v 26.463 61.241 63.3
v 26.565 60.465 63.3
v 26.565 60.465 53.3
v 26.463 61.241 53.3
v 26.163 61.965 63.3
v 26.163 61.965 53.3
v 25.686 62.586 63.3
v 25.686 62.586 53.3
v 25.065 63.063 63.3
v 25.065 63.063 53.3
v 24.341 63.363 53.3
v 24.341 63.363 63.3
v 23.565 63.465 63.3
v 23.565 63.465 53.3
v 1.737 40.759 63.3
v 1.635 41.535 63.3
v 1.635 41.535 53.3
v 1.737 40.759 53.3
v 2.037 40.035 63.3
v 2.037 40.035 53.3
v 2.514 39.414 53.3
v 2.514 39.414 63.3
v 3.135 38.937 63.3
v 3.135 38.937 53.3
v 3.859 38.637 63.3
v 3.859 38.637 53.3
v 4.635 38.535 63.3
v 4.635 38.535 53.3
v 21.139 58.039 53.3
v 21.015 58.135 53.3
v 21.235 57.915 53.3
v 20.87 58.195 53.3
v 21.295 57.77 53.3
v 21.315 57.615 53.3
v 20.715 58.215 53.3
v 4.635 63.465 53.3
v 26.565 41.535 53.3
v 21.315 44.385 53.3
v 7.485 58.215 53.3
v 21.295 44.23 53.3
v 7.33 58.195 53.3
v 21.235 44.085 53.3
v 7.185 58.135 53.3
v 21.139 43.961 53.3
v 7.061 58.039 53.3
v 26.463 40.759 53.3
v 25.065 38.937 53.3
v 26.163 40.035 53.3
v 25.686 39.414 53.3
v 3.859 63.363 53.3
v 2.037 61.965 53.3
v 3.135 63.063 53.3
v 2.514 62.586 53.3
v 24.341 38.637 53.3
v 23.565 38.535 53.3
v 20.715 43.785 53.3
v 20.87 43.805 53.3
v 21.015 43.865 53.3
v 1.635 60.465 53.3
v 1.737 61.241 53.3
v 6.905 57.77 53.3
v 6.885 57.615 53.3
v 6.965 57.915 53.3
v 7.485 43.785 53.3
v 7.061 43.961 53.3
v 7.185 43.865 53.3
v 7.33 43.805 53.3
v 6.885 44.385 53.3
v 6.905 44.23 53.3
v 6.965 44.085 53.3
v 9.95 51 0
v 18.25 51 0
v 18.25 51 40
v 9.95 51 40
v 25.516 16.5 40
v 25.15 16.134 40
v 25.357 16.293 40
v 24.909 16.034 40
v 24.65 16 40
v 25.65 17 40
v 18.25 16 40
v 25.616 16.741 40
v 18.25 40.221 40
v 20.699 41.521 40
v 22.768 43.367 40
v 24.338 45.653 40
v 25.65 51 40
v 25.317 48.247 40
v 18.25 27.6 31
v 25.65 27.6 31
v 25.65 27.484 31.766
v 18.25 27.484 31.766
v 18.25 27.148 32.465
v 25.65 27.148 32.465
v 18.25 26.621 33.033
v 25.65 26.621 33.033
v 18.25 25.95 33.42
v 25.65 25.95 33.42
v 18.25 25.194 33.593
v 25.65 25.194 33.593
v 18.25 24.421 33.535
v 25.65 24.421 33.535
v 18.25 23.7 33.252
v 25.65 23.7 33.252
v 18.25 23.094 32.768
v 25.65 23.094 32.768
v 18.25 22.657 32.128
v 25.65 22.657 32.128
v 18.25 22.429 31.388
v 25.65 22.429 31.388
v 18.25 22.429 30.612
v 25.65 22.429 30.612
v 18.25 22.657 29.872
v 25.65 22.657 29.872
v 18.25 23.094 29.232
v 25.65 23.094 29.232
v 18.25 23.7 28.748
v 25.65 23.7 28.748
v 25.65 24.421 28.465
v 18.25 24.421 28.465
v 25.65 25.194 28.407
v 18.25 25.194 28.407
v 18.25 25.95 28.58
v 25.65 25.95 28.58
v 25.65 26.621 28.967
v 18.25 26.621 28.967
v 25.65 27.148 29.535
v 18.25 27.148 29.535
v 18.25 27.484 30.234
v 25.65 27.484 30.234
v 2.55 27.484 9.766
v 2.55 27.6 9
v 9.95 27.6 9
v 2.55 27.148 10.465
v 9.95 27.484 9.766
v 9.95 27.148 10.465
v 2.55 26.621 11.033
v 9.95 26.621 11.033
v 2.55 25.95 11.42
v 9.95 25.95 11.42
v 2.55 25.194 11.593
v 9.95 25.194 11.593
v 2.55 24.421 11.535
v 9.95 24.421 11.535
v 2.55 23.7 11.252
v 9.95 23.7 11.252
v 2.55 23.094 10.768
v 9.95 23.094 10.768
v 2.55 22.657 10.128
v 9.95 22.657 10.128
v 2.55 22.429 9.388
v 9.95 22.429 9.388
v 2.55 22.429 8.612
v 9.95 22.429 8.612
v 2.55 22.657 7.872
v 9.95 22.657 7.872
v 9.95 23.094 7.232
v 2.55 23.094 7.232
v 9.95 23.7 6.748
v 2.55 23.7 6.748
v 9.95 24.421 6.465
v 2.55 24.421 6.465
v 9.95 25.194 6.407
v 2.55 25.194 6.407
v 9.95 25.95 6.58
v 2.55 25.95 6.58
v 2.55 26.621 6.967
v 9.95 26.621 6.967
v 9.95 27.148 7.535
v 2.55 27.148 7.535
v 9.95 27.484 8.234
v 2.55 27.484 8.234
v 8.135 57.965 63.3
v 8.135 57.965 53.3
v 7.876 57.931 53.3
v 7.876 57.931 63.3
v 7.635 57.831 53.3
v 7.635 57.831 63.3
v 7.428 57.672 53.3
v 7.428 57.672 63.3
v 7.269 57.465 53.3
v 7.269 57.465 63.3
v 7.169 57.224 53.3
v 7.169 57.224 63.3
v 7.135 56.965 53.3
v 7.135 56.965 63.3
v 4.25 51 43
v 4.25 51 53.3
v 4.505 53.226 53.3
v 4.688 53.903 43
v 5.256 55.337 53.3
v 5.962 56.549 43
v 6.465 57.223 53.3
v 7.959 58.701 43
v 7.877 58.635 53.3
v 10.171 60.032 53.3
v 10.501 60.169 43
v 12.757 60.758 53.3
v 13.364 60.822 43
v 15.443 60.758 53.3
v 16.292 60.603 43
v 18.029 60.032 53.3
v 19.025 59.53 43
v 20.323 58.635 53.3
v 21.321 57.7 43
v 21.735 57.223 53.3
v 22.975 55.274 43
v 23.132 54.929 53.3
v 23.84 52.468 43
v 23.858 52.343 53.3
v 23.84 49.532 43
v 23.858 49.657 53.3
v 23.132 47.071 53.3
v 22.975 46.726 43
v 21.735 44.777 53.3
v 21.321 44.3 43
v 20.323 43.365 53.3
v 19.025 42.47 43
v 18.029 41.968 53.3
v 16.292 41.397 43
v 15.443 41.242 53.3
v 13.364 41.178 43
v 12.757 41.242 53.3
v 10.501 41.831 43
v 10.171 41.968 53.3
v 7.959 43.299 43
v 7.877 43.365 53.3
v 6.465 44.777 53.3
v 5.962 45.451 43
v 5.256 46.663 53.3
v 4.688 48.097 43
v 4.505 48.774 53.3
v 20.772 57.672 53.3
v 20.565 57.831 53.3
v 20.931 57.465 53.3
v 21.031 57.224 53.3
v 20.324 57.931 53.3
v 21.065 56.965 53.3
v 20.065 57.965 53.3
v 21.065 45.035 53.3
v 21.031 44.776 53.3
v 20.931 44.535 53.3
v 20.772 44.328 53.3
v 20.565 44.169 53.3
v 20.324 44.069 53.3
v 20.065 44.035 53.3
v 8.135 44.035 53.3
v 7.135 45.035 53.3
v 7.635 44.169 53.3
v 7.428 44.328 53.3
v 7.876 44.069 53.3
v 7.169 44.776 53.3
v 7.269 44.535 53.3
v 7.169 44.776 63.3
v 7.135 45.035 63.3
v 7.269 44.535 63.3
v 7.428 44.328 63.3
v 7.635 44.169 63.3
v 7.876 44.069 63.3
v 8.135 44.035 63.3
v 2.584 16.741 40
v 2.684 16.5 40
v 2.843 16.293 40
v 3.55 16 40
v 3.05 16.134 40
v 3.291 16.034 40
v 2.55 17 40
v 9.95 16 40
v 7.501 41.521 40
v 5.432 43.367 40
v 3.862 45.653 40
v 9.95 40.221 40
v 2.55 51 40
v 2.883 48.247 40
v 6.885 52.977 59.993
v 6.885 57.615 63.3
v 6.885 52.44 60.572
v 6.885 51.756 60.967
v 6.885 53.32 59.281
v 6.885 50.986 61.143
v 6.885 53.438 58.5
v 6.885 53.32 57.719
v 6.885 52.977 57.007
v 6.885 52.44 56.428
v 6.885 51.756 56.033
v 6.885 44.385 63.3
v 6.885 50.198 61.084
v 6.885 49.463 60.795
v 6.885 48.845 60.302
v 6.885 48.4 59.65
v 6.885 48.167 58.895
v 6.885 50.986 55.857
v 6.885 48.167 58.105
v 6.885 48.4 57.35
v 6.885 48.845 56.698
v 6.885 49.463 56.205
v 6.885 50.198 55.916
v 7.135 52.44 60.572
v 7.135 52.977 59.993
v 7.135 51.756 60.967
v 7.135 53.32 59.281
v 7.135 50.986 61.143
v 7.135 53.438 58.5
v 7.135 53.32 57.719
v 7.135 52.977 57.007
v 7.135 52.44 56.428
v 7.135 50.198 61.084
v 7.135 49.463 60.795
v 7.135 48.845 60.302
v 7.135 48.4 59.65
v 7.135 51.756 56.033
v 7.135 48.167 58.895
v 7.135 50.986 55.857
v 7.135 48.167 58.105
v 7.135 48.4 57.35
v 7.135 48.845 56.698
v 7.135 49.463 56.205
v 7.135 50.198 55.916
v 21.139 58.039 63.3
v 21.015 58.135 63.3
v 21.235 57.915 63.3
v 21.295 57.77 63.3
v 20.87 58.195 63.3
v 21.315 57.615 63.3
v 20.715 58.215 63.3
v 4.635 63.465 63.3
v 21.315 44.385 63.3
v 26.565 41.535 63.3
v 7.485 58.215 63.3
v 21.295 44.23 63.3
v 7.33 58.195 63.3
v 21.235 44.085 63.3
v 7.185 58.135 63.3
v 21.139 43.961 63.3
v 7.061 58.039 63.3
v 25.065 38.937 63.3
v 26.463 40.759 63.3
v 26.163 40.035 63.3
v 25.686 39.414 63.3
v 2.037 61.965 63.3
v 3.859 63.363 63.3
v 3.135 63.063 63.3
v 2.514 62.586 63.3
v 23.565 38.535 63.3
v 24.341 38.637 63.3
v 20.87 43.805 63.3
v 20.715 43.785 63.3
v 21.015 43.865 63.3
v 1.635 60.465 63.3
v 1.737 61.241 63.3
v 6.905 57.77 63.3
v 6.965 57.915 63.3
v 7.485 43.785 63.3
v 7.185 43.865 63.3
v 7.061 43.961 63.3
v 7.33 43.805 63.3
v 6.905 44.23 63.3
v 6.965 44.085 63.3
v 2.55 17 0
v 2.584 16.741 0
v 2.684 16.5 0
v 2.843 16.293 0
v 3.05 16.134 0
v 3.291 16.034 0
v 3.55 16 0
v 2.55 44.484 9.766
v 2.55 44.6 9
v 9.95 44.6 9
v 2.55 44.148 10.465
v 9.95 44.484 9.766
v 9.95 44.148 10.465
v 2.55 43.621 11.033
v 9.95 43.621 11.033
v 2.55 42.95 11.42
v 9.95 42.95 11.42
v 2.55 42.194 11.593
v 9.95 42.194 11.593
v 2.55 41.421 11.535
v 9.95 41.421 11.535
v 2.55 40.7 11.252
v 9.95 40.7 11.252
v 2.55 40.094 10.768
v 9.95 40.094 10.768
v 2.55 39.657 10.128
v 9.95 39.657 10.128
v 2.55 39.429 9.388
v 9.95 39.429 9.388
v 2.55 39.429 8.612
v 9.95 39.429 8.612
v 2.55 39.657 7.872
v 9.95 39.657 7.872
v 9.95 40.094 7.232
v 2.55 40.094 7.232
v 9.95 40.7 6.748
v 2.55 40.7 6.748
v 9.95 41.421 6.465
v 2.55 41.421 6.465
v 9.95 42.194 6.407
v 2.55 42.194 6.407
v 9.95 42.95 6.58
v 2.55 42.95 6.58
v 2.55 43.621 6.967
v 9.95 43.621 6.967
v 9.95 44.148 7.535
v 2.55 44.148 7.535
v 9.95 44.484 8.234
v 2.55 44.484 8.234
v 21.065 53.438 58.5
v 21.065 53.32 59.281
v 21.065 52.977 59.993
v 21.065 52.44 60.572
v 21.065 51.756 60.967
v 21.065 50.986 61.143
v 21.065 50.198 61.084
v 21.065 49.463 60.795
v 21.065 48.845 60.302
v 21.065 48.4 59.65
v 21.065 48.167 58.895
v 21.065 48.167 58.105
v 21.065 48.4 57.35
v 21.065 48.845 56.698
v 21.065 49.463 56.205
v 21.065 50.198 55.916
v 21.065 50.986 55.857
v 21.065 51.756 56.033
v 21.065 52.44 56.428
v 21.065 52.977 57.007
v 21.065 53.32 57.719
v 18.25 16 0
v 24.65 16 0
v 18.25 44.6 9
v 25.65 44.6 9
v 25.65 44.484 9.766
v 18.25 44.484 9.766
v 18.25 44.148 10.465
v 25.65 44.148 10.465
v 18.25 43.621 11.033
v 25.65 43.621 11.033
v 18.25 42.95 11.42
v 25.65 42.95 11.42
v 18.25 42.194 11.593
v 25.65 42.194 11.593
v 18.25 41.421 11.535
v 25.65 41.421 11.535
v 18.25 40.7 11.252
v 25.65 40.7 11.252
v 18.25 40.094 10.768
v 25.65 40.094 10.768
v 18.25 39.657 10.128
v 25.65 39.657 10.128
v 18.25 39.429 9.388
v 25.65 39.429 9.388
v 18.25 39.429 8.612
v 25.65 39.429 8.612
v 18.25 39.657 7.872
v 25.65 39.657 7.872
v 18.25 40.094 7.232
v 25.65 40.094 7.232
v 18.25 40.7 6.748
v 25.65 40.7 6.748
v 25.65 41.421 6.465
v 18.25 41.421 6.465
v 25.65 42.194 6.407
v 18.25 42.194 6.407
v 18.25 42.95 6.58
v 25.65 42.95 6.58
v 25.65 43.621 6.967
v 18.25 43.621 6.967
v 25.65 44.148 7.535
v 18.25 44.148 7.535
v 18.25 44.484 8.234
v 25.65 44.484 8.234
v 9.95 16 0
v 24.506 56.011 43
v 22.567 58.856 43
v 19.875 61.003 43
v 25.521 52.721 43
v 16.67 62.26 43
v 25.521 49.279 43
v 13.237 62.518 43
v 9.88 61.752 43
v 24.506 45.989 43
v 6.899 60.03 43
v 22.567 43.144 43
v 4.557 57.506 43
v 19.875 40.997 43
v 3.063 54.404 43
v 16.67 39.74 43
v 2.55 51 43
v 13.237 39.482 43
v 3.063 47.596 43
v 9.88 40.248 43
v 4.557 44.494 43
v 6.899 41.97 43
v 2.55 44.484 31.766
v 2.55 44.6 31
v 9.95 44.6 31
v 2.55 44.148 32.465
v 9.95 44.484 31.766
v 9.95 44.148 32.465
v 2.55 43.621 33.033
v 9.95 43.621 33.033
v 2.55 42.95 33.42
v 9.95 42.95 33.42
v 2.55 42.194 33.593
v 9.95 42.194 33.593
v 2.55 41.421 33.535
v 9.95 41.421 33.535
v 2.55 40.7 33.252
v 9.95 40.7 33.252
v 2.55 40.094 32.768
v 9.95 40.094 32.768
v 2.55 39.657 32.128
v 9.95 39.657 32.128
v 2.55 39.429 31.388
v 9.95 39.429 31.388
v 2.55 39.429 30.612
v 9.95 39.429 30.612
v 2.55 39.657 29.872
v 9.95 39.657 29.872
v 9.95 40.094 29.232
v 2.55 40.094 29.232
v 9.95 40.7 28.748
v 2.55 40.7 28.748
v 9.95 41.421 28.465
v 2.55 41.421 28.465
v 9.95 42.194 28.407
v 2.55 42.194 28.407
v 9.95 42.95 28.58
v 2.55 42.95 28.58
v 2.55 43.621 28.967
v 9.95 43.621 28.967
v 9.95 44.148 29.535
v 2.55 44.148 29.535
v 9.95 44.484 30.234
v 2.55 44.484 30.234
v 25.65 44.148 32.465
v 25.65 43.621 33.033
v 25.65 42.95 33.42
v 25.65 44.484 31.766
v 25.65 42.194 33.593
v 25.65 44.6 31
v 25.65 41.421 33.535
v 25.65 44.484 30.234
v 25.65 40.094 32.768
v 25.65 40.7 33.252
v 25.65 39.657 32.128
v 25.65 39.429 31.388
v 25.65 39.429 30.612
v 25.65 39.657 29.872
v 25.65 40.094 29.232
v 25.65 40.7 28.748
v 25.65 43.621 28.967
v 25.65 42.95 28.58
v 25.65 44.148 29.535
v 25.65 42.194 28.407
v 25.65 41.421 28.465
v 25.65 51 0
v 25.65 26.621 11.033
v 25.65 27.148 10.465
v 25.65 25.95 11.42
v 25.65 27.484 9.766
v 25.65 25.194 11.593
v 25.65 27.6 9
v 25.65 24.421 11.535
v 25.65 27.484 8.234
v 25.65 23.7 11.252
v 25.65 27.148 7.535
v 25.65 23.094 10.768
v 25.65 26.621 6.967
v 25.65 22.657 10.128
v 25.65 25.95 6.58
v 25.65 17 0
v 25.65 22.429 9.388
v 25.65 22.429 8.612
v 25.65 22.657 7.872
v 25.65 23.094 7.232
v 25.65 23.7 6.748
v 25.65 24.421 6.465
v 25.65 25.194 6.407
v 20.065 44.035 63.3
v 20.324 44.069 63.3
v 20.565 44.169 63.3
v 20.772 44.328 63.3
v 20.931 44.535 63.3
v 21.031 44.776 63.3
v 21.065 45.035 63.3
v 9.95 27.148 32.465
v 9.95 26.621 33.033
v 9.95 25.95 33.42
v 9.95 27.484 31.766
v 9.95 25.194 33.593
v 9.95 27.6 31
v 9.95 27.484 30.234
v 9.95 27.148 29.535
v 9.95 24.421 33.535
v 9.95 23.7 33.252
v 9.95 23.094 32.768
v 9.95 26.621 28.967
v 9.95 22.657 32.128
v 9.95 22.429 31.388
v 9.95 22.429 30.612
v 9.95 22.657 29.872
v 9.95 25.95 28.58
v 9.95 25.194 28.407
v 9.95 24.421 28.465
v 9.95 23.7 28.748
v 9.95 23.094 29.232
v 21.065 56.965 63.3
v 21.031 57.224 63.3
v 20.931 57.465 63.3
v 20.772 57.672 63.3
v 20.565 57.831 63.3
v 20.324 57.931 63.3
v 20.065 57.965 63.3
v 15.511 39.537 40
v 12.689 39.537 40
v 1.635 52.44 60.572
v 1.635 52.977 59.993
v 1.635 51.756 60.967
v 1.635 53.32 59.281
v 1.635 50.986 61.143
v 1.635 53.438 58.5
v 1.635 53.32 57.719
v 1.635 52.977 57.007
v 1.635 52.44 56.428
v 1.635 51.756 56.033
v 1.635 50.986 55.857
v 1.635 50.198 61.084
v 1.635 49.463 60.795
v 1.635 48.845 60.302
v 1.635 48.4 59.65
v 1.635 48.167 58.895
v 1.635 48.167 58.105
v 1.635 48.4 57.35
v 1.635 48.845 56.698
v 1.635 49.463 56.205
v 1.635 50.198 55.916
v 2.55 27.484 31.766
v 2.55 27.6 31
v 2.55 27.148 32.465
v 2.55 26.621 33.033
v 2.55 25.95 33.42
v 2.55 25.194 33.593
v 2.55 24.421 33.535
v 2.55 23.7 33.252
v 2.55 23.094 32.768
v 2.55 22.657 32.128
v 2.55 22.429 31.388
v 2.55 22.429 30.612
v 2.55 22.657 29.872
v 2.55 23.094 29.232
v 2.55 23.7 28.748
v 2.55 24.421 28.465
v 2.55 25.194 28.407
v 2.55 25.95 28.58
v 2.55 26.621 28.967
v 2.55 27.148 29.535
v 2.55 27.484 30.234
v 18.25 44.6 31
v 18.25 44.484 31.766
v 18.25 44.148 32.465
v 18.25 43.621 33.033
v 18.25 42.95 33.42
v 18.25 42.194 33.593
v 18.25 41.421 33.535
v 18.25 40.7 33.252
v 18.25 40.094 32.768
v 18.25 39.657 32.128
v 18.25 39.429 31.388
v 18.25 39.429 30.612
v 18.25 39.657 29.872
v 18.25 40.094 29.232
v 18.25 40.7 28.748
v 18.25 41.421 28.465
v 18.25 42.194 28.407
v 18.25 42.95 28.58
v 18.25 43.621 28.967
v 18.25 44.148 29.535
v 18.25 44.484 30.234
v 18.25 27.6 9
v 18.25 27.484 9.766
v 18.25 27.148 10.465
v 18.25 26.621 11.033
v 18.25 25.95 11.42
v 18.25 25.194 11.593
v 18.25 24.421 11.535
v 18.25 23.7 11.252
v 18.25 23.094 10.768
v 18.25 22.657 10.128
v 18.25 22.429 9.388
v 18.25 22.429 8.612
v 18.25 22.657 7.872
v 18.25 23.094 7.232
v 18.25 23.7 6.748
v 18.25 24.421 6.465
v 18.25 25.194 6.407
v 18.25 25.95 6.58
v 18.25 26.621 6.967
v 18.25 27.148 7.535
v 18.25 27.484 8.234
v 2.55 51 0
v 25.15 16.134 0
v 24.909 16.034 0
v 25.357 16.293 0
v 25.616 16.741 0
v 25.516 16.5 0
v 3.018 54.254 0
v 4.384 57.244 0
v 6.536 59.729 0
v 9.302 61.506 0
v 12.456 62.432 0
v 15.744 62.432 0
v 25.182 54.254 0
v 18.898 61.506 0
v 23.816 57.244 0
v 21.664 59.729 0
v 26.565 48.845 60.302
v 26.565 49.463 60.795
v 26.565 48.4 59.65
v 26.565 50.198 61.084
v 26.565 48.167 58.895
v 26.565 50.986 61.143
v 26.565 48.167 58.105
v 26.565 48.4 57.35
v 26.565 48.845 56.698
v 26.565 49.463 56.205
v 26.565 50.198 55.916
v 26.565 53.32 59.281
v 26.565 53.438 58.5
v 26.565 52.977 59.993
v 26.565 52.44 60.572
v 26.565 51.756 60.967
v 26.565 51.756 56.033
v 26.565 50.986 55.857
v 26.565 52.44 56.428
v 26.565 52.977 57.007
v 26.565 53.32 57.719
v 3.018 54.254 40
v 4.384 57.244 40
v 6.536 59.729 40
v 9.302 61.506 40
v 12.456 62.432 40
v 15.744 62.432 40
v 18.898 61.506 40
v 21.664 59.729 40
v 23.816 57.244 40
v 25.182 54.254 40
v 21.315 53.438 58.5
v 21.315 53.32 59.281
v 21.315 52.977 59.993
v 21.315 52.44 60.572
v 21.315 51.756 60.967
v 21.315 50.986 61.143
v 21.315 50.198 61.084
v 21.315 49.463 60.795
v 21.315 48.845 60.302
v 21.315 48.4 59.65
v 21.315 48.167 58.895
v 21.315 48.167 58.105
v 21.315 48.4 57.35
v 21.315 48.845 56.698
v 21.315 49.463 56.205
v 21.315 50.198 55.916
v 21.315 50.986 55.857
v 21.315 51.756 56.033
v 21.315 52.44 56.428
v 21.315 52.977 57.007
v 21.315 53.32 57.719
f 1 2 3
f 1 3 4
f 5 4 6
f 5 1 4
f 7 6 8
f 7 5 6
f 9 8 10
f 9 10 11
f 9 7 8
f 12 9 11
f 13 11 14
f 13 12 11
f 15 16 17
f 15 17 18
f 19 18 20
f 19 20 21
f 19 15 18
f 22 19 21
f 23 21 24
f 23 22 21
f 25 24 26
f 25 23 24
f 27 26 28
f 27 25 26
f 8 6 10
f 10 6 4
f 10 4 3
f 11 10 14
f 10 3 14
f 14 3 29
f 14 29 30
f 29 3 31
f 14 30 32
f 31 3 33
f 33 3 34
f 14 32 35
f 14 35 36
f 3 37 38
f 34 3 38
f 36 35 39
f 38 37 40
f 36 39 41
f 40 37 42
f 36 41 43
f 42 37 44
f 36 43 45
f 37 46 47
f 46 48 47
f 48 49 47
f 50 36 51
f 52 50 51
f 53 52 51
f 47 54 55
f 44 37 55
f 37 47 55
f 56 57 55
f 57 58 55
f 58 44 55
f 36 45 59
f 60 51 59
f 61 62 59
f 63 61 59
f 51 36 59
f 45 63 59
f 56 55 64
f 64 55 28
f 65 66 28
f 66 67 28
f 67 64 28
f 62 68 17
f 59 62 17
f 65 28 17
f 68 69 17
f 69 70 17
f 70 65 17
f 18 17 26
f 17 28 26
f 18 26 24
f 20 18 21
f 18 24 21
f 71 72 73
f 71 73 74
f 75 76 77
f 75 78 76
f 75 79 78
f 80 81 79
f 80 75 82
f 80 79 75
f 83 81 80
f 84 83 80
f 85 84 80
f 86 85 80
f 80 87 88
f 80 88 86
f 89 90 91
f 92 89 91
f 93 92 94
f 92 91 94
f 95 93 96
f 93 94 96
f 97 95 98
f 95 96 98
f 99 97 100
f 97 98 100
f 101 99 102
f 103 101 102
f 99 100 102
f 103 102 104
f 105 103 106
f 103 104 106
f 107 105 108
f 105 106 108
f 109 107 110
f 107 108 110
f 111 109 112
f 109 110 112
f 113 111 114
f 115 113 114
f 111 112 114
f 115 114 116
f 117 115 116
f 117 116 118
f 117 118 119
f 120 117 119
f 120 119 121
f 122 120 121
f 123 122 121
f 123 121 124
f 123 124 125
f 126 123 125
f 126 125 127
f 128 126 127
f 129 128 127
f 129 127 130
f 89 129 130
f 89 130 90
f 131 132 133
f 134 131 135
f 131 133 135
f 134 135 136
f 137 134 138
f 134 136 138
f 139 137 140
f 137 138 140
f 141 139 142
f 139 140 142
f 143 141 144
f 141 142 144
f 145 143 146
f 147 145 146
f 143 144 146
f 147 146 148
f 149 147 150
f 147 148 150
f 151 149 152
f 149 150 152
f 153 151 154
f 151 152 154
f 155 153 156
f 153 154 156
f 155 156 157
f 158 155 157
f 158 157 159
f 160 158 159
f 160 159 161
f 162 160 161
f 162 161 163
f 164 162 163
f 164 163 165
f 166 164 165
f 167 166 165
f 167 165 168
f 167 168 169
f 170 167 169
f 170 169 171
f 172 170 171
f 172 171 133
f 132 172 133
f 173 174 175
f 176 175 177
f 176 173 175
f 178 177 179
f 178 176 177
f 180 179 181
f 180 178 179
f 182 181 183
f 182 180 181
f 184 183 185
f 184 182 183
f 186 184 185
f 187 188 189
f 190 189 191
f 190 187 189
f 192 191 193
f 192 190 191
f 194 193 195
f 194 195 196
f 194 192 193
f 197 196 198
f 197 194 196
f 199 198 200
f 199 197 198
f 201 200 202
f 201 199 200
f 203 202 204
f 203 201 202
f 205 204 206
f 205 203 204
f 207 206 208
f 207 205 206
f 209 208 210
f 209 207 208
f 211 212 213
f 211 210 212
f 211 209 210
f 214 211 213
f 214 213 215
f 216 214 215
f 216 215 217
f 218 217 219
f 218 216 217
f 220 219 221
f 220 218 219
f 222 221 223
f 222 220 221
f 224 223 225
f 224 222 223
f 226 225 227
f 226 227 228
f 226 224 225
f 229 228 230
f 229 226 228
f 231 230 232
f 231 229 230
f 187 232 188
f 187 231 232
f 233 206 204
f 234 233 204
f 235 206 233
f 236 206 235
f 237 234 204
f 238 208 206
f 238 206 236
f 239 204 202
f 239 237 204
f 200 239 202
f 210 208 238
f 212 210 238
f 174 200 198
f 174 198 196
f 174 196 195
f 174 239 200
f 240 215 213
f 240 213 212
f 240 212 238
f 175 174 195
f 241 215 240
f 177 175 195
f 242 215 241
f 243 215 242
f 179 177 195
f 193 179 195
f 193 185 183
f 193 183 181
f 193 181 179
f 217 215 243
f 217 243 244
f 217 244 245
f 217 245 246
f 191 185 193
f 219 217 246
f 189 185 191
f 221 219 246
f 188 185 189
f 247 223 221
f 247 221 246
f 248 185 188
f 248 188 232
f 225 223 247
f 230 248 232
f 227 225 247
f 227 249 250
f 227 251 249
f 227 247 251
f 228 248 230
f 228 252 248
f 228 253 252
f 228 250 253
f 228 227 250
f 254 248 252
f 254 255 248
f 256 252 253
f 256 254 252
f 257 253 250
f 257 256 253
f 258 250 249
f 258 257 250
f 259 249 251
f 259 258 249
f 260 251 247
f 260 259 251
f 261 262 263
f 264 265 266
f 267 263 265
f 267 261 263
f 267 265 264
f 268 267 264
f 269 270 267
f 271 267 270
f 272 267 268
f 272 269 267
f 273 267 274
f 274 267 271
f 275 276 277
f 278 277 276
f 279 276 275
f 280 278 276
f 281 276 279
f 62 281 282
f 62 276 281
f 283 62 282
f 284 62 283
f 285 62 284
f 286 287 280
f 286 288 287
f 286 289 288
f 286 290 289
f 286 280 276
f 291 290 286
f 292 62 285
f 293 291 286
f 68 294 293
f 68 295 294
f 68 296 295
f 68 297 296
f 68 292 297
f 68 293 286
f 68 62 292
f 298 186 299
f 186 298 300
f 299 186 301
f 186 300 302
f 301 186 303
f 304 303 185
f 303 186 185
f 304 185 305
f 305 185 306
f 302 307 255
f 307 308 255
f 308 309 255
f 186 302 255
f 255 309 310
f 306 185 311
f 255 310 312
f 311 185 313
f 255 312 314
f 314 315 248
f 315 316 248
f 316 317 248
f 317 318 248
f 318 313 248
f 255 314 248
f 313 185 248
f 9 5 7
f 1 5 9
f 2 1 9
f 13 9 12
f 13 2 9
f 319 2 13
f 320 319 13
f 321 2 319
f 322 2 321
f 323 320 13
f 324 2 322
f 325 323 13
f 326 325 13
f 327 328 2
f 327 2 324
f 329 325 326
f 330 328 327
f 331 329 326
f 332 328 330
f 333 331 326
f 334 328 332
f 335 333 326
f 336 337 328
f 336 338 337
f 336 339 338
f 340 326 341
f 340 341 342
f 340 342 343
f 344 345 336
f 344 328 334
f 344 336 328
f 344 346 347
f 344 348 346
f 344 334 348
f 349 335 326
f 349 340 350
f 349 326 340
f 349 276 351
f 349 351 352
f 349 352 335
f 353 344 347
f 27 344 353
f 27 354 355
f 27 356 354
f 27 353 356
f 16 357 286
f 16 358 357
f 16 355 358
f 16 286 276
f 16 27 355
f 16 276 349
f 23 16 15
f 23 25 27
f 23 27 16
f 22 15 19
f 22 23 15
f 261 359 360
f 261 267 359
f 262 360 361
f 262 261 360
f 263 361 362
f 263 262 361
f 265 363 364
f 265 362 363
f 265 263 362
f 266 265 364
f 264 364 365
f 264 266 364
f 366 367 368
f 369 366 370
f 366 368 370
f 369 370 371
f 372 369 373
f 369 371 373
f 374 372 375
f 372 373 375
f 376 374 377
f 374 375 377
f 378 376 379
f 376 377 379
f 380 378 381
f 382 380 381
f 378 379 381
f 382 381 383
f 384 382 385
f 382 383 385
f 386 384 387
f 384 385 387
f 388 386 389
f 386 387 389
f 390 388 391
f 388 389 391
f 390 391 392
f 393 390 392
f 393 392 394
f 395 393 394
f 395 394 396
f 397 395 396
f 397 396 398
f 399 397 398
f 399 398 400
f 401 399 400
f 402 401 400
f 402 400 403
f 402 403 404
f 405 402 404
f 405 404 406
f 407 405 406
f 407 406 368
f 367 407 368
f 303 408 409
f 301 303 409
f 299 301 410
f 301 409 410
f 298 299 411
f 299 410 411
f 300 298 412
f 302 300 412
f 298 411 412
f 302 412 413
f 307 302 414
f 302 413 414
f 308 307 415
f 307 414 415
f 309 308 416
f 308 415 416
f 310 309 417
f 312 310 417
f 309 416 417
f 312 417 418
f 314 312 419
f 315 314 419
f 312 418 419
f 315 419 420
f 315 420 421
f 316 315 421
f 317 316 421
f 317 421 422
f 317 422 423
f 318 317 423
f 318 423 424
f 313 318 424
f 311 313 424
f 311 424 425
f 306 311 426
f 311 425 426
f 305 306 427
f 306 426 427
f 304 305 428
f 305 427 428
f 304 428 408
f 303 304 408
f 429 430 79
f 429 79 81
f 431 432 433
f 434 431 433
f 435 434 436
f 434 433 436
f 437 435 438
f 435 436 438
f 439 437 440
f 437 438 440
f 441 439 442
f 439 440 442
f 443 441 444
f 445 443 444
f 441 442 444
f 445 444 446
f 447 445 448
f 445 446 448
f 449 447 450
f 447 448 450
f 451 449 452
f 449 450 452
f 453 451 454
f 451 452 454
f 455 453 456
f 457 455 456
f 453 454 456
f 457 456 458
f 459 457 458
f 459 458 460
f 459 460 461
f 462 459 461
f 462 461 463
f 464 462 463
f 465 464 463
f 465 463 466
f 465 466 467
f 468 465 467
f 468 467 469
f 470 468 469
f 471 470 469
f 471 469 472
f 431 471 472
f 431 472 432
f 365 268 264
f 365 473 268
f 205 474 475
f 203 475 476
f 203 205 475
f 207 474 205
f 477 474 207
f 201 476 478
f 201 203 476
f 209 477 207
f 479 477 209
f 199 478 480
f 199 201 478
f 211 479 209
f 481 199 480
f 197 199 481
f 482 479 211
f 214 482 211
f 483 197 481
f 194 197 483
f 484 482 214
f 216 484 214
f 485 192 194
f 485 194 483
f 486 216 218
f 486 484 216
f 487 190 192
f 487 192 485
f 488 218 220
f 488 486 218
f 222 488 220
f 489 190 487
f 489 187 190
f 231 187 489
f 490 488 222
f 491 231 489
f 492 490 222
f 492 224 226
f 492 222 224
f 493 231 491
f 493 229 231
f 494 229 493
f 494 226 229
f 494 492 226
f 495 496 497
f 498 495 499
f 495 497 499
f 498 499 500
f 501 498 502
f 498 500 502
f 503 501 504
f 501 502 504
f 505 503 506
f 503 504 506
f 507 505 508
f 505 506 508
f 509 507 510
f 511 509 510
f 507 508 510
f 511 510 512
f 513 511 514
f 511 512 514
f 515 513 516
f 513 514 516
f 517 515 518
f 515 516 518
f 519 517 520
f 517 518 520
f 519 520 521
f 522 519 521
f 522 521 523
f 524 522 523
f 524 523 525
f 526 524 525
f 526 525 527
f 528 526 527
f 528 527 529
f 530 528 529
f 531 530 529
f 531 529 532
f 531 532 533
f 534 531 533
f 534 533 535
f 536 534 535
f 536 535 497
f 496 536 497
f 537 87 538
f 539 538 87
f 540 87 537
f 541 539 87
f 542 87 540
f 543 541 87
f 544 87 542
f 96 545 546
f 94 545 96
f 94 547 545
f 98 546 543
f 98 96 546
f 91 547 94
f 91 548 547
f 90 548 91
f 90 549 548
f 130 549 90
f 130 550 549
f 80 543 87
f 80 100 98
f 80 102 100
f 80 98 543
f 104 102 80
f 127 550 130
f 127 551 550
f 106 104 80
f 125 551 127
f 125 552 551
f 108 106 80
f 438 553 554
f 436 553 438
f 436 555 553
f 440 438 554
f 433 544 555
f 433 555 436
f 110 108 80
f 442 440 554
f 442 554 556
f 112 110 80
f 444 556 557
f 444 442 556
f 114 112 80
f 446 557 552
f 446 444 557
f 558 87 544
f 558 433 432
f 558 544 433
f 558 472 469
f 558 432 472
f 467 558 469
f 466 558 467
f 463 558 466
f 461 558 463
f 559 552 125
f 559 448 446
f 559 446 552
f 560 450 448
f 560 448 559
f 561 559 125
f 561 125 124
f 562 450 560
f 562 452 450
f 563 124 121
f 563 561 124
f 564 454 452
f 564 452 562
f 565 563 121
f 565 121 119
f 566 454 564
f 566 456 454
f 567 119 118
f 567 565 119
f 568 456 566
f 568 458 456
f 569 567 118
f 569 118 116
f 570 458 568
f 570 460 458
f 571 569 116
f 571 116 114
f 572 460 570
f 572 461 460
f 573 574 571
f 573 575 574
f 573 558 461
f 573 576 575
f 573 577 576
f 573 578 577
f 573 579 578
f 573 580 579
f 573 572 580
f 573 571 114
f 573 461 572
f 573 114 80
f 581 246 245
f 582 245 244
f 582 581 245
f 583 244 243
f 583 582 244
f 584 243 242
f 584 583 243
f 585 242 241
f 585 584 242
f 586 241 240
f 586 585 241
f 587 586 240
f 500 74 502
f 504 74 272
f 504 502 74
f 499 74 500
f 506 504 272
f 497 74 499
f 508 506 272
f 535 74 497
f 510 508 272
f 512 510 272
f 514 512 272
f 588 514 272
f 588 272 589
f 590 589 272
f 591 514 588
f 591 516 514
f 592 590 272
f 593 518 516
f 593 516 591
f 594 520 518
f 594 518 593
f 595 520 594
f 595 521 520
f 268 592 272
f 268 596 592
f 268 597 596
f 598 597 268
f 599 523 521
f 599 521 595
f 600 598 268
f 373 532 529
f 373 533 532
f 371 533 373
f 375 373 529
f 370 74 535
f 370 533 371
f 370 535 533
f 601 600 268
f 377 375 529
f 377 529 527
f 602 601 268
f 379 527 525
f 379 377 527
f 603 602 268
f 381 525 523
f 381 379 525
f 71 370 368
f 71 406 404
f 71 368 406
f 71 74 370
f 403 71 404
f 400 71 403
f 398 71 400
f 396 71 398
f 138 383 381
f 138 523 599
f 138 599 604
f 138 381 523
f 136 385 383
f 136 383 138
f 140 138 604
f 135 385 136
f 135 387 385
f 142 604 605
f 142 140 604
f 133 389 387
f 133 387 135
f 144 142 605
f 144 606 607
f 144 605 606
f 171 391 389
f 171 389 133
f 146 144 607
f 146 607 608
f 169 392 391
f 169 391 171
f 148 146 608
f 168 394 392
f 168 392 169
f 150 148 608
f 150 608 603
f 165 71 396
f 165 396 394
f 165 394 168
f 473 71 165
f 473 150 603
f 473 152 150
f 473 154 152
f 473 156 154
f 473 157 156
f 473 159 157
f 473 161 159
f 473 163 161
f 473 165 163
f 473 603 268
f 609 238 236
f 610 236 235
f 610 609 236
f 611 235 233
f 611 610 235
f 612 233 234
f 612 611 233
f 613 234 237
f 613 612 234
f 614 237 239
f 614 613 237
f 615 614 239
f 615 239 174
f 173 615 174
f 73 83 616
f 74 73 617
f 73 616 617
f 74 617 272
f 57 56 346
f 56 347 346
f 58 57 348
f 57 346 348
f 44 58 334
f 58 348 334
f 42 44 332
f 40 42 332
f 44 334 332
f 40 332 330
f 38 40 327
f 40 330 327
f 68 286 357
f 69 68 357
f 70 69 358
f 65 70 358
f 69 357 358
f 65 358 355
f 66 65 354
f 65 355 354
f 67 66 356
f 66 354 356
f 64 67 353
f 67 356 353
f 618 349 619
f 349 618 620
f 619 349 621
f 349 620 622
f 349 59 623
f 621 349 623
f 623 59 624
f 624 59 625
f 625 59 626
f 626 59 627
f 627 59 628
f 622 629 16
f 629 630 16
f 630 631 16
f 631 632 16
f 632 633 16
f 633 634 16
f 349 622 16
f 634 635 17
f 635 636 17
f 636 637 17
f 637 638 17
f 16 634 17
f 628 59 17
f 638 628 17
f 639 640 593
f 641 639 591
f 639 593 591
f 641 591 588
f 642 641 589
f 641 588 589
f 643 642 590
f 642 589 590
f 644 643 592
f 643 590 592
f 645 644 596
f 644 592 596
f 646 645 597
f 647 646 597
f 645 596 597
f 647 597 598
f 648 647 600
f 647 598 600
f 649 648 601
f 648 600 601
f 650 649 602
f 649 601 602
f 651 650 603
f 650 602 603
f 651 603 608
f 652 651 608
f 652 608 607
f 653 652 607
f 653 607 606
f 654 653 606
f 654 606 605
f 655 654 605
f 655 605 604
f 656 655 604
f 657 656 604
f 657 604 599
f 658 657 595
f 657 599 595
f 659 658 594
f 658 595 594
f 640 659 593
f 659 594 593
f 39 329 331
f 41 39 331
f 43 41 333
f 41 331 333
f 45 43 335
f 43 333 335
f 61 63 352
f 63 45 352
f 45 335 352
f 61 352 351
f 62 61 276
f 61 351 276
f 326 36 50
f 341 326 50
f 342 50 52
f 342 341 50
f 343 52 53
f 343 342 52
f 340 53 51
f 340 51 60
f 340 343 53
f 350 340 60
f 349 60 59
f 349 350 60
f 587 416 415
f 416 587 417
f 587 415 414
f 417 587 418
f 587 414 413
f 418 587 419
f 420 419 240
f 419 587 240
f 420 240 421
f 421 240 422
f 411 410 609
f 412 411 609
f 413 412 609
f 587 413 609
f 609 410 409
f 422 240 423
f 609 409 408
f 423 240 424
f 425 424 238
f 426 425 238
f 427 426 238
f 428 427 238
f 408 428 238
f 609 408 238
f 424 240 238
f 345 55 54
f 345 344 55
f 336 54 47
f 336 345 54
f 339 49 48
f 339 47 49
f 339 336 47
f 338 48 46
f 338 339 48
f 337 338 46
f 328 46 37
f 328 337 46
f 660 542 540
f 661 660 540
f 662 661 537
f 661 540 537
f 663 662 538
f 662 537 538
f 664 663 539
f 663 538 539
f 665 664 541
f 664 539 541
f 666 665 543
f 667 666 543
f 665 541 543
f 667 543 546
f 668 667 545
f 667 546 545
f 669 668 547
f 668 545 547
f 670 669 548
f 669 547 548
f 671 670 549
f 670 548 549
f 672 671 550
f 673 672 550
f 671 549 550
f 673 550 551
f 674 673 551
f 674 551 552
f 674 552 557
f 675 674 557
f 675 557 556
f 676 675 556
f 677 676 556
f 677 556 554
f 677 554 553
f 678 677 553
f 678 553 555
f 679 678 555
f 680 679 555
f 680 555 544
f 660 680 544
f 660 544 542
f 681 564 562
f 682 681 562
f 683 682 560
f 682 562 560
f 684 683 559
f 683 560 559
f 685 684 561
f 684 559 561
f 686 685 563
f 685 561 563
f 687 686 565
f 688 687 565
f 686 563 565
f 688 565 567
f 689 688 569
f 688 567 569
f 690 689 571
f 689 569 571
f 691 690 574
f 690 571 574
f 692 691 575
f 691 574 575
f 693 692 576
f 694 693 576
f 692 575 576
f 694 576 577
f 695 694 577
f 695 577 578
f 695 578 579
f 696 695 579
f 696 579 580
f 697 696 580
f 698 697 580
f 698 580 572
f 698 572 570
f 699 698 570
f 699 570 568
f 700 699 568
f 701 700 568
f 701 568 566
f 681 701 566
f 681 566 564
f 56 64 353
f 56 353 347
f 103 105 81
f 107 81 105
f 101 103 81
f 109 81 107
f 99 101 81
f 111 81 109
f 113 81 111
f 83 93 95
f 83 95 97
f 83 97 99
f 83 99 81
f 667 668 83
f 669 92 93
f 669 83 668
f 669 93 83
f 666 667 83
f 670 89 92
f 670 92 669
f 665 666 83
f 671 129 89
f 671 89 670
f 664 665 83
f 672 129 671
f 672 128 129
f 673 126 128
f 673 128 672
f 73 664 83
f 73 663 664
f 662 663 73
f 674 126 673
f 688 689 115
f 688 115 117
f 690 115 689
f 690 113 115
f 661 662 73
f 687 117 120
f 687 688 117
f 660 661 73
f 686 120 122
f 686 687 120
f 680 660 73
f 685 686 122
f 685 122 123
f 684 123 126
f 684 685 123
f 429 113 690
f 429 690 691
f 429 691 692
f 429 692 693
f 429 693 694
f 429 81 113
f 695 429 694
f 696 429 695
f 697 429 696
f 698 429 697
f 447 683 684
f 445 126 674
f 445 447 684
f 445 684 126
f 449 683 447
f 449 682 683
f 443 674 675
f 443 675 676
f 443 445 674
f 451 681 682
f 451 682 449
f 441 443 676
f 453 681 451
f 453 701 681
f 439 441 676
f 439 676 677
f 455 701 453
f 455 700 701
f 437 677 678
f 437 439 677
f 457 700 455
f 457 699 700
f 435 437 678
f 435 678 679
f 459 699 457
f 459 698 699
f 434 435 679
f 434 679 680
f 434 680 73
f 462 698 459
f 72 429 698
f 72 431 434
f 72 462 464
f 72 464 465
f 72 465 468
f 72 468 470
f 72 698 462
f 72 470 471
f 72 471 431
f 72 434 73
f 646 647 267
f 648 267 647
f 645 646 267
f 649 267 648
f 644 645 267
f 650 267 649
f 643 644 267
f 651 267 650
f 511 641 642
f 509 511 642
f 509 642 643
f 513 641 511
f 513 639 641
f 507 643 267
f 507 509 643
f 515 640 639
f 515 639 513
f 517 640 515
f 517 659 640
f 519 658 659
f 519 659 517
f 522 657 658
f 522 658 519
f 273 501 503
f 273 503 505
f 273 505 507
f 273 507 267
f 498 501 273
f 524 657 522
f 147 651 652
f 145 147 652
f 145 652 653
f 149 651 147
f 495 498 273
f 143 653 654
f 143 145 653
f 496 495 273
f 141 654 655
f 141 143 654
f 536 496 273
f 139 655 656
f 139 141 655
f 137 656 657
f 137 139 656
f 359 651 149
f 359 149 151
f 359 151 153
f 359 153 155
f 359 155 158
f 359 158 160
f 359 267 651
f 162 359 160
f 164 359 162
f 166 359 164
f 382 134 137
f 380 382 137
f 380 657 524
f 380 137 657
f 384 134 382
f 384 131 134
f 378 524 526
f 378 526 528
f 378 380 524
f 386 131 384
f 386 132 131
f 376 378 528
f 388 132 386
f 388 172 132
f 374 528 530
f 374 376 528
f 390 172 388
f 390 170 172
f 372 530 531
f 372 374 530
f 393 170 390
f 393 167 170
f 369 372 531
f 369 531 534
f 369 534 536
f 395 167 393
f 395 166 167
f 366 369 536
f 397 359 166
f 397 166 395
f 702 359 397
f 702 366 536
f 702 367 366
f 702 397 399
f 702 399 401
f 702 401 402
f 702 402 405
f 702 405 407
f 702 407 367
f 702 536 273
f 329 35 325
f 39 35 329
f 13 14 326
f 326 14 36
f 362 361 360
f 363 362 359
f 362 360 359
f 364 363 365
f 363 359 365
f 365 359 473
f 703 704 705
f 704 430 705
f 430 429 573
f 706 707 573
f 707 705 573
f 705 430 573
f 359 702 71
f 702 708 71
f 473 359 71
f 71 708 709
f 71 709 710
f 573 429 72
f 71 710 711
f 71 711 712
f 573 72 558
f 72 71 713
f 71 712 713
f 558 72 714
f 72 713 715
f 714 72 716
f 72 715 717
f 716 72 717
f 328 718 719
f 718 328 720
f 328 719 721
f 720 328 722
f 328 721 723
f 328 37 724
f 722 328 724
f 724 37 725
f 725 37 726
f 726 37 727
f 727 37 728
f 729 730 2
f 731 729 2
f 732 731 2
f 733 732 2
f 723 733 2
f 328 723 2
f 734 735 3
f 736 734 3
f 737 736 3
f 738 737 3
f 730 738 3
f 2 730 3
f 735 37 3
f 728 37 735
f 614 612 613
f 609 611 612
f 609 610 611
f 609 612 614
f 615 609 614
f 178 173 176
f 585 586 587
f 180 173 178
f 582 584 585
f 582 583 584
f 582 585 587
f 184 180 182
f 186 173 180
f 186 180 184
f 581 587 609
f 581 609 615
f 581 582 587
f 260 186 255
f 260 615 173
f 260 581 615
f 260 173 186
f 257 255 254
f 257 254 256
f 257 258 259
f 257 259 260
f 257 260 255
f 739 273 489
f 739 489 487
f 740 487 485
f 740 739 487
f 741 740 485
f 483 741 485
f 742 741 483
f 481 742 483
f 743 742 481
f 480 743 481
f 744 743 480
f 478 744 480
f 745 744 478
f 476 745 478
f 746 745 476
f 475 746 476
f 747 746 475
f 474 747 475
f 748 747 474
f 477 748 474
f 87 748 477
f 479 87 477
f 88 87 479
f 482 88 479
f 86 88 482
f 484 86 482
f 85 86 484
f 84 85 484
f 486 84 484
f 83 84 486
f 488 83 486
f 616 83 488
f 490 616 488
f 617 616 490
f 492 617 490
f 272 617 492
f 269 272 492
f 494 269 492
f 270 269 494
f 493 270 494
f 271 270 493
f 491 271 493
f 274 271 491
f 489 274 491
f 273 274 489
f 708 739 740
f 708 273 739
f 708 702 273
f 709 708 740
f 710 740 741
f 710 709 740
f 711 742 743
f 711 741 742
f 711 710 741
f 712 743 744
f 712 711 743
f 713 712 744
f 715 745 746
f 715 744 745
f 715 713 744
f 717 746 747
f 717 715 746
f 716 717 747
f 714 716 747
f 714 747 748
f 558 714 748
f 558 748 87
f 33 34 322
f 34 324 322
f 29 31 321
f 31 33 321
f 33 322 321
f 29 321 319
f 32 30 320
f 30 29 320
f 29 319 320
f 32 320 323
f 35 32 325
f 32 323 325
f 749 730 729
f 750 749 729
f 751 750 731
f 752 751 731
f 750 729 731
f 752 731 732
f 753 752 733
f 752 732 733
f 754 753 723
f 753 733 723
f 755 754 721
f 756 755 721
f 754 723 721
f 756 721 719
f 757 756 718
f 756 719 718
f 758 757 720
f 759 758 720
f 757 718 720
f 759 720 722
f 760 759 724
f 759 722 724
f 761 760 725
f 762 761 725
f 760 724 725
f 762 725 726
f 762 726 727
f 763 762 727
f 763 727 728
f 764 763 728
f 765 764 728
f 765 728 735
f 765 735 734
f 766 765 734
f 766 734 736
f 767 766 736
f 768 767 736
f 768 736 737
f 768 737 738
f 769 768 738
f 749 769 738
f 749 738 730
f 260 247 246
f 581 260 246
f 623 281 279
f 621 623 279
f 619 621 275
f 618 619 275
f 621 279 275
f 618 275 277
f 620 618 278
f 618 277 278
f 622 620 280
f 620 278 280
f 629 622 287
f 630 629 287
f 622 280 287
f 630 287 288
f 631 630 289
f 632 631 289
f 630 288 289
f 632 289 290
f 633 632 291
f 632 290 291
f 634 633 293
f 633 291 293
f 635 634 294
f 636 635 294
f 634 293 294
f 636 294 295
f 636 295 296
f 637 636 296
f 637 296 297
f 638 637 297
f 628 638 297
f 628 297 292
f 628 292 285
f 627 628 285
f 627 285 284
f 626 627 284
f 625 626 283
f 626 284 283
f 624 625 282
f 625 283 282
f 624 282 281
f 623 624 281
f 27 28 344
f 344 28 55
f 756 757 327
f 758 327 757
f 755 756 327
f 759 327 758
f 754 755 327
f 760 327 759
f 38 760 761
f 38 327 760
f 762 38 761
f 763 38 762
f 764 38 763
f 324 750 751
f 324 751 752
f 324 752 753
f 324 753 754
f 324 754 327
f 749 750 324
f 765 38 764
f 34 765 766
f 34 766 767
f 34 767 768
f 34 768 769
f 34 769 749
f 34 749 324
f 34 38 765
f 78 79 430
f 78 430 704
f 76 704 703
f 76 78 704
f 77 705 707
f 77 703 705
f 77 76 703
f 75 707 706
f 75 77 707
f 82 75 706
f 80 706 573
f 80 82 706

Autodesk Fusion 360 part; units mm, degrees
sketch "Skizze1" plane through (0, 0, 0) normal (0, 0, 1) x (1, 0, 0)
  line L0 (18.25, 16) -> (18.25, 51)
  line L1 (18.25, 51) -> (9.95, 51)
  line L2 (9.95, 51) -> (9.95, 16)
  line L3 (9.95, 16) -> (2.55, 16)
  line L4 (2.55, 16) -> (2.55, 51)
  line L5 (9.95, 51) -> (18.25, 51)
  line L6 (25.65, 51) -> (25.65, 16)
  line L7 (25.65, 16) -> (18.25, 16)
  arc A0 (25.65, 51) -> (2.55, 51) centre (14.1, 51) ccw
  dimension "d1" = 8.3
  dimension "d2" = 7.4
  dimension "d3" = 7.4
  dimension "d4" = 35
  dimension "d36" = 11.55
extrude "Extrusion1" add sketch "Skizze1" along normal blind 40 makes body 1
sketch "Skizze2" plane through (25.65, 0, 0) normal (1, 0, 0) x (0, 1, 0)
  line L0 (16, 0) -> (51, 0)
  line L1 (51, 0) -> (51, 40)
  line L2 (51, 40) -> (16, 40)
  line L3 (16, 40) -> (16, 0)
  circle A0 centre (25, 31) radius 2.6
  circle A1 centre (42, 31) radius 2.6
  circle A2 centre (25, 9) radius 2.6
  circle A3 centre (42, 9) radius 2.6
  dimension "d7" = 5.2
  dimension "d8" = 9
  dimension "d9" = 9
  dimension "d10" = 5.2
  dimension "d11" = 9
  dimension "d12" = 9
  dimension "d13" = 5.2
  dimension "d14" = 5.2
  dimension "d15" = 9
  dimension "d16" = 9
  dimension "d17" = 9
  dimension "d18" = 9
extrude "Extrusion2" cut sketch "Skizze2" against normal up to surface (23.1 mm away) contours A0 | A1 | A2 | A3 bodies 1
sketch "Skizze3" plane through (0, 0, 40) normal (0, 0, 1) x (-1, 0, 0)
  line L0 (-25.65, -16) -> (-25.65, -51)
  arc A0 (-25.65, -51) -> (-2.55, -51) centre (-14.1, -51) ccw
  line L1 (-2.55, -51) -> (-2.55, -16)
  line L2 (-2.55, -16) -> (-9.95, -16)
  line L3 (-9.95, -16) -> (-9.95, -51)
  line L4 (-9.95, -51) -> (-18.25, -51)
  line L5 (-18.25, -51) -> (-18.25, -16)
  line L6 (-18.25, -16) -> (-25.65, -16)
  circle A1 centre (-14.1, -51) radius 11.55
extrude "Extrusion6" add sketch "Skizze3" along normal blind 3 contours A0 L3 L4 L5 A1 | L3 L4 L5 A1 bodies 1
sketch "Skizze7" plane through (0, 0, 43) normal (0, 0, 1) x (-1, 0, 0)
  circle A0 centre (-14.1, -51) radius 11.55
  circle A1 centre (-14.1, -51) radius 9.85
  dimension "d39" = 19.7
extrude "Extrusion7" add sketch "Skizze7" along normal blind 10.3 contours A1 bodies 1
sketch "Skizze5" plane through (0, 0, 53.3) normal (0, 0, 1) x (-1, 0, 0)
  circle A0 centre (-14.1, -51) radius 9.85
  line L0 (-21.065, -57.965) -> (-7.135, -57.965)
  line L1 (-7.135, -57.965) -> (-7.135, -44.035)
  line L2 (-7.135, -44.035) -> (-21.065, -44.035)
  line L3 (-21.065, -44.035) -> (-21.065, -57.965)
  line L4 (-21.065, -57.965) -> (-7.135, -44.035) construction
  line L5 (-7.135, -57.965) -> (-21.065, -44.035) construction
  line L6 (-6.885, -43.785) -> (-21.315, -43.785)
  line L7 (-21.315, -43.785) -> (-21.315, -58.215)
  line L8 (-21.315, -58.215) -> (-6.885, -58.215)
  line L9 (-6.885, -58.215) -> (-6.885, -43.785)
  line L10 (-26.565, -63.465) -> (-1.635, -63.465)
  line L11 (-1.635, -63.465) -> (-1.635, -38.535)
  line L12 (-1.635, -38.535) -> (-26.565, -38.535)
  line L13 (-26.565, -38.535) -> (-26.565, -63.465)
  point P0 (-14.1, -51)
  point P1 (-14.1, -51)
  dimension "d48" = 0.25
  dimension "d49" = 5.5
extrude "Extrusion8" add sketch "Skizze5" along normal blind 10 contours L0 L1 L2 L3 bodies 1
sketch "Skizze6" plane through (21.065, 0, 0) normal (1, 0, 0) x (0, 1, 0)
  line L0 (59.0964, 53.5) -> (59.0964, 63.5)
  line L1 (59.0964, 63.5) -> (42.9036, 63.5)
  line L2 (42.9036, 63.5) -> (42.9036, 53.5)
  circle A0 centre (50.7879, 58.5) radius 2.65
  line L3 (45.5676, 53.5) -> (56.4324, 53.5)
  line L4 (56.4324, 53.5) -> (59.0964, 53.5)
  line L5 (42.9036, 53.5) -> (45.5676, 53.5)
  line L6 (44.035, 53.3) -> (57.965, 53.3)
  line L7 (57.965, 53.3) -> (57.965, 63.3)
  line L8 (57.965, 63.3) -> (44.035, 63.3)
  line L9 (44.035, 63.3) -> (44.035, 53.3)
  dimension "d25" = 5.3
  dimension "d27" = 7.8842
  dimension "d28" = 7.8842
  dimension "d29" = 5
fillet "Abrundung1" radius 1 4 edges at (21.065, 57.965, 58.3) (21.065, 44.035, 58.3) (7.135, 44.035, 58.3) (7.135, 57.965, 58.3) on bodies 1
fillet "Abrundung2" radius 1 2 edges at (25.65, 16, 20) (2.55, 16, 20) on bodies 1
extrude "Extrusion9" add sketch "Skizze5" along normal blind 10 separate body contours A0 L9 | A0 L6 | A0 L8 | A0 L7 | L10 L11 L12 L13 makes body 2
fillet "Abrundung3" radius 0.6 4 edges at (21.315, 43.785, 58.3) (6.885, 43.785, 58.3) (6.885, 58.215, 58.3) (21.315, 58.215, 58.3) on bodies 2
extrude "Extrusion5" cut sketch "Skizze6" along normal blind -24 and the other way blind -12 contours A0 bodies 1 2
fillet "Abrundung4" radius 3 4 edges at (1.635, 38.535, 58.3) (26.565, 38.535, 58.3) (26.565, 63.465, 58.3) (1.635, 63.465, 58.3) on bodies 2
equation "d3 = d2"
equation "d10 = d7"
equation "d11 = d12"
equation "d14 = d7"
equation "d15 = d8"
equation "d16 = d12"
equation "d17 = d12"
equation "d18 = d9"
equation "d36 = d2 + d1 / 2"
